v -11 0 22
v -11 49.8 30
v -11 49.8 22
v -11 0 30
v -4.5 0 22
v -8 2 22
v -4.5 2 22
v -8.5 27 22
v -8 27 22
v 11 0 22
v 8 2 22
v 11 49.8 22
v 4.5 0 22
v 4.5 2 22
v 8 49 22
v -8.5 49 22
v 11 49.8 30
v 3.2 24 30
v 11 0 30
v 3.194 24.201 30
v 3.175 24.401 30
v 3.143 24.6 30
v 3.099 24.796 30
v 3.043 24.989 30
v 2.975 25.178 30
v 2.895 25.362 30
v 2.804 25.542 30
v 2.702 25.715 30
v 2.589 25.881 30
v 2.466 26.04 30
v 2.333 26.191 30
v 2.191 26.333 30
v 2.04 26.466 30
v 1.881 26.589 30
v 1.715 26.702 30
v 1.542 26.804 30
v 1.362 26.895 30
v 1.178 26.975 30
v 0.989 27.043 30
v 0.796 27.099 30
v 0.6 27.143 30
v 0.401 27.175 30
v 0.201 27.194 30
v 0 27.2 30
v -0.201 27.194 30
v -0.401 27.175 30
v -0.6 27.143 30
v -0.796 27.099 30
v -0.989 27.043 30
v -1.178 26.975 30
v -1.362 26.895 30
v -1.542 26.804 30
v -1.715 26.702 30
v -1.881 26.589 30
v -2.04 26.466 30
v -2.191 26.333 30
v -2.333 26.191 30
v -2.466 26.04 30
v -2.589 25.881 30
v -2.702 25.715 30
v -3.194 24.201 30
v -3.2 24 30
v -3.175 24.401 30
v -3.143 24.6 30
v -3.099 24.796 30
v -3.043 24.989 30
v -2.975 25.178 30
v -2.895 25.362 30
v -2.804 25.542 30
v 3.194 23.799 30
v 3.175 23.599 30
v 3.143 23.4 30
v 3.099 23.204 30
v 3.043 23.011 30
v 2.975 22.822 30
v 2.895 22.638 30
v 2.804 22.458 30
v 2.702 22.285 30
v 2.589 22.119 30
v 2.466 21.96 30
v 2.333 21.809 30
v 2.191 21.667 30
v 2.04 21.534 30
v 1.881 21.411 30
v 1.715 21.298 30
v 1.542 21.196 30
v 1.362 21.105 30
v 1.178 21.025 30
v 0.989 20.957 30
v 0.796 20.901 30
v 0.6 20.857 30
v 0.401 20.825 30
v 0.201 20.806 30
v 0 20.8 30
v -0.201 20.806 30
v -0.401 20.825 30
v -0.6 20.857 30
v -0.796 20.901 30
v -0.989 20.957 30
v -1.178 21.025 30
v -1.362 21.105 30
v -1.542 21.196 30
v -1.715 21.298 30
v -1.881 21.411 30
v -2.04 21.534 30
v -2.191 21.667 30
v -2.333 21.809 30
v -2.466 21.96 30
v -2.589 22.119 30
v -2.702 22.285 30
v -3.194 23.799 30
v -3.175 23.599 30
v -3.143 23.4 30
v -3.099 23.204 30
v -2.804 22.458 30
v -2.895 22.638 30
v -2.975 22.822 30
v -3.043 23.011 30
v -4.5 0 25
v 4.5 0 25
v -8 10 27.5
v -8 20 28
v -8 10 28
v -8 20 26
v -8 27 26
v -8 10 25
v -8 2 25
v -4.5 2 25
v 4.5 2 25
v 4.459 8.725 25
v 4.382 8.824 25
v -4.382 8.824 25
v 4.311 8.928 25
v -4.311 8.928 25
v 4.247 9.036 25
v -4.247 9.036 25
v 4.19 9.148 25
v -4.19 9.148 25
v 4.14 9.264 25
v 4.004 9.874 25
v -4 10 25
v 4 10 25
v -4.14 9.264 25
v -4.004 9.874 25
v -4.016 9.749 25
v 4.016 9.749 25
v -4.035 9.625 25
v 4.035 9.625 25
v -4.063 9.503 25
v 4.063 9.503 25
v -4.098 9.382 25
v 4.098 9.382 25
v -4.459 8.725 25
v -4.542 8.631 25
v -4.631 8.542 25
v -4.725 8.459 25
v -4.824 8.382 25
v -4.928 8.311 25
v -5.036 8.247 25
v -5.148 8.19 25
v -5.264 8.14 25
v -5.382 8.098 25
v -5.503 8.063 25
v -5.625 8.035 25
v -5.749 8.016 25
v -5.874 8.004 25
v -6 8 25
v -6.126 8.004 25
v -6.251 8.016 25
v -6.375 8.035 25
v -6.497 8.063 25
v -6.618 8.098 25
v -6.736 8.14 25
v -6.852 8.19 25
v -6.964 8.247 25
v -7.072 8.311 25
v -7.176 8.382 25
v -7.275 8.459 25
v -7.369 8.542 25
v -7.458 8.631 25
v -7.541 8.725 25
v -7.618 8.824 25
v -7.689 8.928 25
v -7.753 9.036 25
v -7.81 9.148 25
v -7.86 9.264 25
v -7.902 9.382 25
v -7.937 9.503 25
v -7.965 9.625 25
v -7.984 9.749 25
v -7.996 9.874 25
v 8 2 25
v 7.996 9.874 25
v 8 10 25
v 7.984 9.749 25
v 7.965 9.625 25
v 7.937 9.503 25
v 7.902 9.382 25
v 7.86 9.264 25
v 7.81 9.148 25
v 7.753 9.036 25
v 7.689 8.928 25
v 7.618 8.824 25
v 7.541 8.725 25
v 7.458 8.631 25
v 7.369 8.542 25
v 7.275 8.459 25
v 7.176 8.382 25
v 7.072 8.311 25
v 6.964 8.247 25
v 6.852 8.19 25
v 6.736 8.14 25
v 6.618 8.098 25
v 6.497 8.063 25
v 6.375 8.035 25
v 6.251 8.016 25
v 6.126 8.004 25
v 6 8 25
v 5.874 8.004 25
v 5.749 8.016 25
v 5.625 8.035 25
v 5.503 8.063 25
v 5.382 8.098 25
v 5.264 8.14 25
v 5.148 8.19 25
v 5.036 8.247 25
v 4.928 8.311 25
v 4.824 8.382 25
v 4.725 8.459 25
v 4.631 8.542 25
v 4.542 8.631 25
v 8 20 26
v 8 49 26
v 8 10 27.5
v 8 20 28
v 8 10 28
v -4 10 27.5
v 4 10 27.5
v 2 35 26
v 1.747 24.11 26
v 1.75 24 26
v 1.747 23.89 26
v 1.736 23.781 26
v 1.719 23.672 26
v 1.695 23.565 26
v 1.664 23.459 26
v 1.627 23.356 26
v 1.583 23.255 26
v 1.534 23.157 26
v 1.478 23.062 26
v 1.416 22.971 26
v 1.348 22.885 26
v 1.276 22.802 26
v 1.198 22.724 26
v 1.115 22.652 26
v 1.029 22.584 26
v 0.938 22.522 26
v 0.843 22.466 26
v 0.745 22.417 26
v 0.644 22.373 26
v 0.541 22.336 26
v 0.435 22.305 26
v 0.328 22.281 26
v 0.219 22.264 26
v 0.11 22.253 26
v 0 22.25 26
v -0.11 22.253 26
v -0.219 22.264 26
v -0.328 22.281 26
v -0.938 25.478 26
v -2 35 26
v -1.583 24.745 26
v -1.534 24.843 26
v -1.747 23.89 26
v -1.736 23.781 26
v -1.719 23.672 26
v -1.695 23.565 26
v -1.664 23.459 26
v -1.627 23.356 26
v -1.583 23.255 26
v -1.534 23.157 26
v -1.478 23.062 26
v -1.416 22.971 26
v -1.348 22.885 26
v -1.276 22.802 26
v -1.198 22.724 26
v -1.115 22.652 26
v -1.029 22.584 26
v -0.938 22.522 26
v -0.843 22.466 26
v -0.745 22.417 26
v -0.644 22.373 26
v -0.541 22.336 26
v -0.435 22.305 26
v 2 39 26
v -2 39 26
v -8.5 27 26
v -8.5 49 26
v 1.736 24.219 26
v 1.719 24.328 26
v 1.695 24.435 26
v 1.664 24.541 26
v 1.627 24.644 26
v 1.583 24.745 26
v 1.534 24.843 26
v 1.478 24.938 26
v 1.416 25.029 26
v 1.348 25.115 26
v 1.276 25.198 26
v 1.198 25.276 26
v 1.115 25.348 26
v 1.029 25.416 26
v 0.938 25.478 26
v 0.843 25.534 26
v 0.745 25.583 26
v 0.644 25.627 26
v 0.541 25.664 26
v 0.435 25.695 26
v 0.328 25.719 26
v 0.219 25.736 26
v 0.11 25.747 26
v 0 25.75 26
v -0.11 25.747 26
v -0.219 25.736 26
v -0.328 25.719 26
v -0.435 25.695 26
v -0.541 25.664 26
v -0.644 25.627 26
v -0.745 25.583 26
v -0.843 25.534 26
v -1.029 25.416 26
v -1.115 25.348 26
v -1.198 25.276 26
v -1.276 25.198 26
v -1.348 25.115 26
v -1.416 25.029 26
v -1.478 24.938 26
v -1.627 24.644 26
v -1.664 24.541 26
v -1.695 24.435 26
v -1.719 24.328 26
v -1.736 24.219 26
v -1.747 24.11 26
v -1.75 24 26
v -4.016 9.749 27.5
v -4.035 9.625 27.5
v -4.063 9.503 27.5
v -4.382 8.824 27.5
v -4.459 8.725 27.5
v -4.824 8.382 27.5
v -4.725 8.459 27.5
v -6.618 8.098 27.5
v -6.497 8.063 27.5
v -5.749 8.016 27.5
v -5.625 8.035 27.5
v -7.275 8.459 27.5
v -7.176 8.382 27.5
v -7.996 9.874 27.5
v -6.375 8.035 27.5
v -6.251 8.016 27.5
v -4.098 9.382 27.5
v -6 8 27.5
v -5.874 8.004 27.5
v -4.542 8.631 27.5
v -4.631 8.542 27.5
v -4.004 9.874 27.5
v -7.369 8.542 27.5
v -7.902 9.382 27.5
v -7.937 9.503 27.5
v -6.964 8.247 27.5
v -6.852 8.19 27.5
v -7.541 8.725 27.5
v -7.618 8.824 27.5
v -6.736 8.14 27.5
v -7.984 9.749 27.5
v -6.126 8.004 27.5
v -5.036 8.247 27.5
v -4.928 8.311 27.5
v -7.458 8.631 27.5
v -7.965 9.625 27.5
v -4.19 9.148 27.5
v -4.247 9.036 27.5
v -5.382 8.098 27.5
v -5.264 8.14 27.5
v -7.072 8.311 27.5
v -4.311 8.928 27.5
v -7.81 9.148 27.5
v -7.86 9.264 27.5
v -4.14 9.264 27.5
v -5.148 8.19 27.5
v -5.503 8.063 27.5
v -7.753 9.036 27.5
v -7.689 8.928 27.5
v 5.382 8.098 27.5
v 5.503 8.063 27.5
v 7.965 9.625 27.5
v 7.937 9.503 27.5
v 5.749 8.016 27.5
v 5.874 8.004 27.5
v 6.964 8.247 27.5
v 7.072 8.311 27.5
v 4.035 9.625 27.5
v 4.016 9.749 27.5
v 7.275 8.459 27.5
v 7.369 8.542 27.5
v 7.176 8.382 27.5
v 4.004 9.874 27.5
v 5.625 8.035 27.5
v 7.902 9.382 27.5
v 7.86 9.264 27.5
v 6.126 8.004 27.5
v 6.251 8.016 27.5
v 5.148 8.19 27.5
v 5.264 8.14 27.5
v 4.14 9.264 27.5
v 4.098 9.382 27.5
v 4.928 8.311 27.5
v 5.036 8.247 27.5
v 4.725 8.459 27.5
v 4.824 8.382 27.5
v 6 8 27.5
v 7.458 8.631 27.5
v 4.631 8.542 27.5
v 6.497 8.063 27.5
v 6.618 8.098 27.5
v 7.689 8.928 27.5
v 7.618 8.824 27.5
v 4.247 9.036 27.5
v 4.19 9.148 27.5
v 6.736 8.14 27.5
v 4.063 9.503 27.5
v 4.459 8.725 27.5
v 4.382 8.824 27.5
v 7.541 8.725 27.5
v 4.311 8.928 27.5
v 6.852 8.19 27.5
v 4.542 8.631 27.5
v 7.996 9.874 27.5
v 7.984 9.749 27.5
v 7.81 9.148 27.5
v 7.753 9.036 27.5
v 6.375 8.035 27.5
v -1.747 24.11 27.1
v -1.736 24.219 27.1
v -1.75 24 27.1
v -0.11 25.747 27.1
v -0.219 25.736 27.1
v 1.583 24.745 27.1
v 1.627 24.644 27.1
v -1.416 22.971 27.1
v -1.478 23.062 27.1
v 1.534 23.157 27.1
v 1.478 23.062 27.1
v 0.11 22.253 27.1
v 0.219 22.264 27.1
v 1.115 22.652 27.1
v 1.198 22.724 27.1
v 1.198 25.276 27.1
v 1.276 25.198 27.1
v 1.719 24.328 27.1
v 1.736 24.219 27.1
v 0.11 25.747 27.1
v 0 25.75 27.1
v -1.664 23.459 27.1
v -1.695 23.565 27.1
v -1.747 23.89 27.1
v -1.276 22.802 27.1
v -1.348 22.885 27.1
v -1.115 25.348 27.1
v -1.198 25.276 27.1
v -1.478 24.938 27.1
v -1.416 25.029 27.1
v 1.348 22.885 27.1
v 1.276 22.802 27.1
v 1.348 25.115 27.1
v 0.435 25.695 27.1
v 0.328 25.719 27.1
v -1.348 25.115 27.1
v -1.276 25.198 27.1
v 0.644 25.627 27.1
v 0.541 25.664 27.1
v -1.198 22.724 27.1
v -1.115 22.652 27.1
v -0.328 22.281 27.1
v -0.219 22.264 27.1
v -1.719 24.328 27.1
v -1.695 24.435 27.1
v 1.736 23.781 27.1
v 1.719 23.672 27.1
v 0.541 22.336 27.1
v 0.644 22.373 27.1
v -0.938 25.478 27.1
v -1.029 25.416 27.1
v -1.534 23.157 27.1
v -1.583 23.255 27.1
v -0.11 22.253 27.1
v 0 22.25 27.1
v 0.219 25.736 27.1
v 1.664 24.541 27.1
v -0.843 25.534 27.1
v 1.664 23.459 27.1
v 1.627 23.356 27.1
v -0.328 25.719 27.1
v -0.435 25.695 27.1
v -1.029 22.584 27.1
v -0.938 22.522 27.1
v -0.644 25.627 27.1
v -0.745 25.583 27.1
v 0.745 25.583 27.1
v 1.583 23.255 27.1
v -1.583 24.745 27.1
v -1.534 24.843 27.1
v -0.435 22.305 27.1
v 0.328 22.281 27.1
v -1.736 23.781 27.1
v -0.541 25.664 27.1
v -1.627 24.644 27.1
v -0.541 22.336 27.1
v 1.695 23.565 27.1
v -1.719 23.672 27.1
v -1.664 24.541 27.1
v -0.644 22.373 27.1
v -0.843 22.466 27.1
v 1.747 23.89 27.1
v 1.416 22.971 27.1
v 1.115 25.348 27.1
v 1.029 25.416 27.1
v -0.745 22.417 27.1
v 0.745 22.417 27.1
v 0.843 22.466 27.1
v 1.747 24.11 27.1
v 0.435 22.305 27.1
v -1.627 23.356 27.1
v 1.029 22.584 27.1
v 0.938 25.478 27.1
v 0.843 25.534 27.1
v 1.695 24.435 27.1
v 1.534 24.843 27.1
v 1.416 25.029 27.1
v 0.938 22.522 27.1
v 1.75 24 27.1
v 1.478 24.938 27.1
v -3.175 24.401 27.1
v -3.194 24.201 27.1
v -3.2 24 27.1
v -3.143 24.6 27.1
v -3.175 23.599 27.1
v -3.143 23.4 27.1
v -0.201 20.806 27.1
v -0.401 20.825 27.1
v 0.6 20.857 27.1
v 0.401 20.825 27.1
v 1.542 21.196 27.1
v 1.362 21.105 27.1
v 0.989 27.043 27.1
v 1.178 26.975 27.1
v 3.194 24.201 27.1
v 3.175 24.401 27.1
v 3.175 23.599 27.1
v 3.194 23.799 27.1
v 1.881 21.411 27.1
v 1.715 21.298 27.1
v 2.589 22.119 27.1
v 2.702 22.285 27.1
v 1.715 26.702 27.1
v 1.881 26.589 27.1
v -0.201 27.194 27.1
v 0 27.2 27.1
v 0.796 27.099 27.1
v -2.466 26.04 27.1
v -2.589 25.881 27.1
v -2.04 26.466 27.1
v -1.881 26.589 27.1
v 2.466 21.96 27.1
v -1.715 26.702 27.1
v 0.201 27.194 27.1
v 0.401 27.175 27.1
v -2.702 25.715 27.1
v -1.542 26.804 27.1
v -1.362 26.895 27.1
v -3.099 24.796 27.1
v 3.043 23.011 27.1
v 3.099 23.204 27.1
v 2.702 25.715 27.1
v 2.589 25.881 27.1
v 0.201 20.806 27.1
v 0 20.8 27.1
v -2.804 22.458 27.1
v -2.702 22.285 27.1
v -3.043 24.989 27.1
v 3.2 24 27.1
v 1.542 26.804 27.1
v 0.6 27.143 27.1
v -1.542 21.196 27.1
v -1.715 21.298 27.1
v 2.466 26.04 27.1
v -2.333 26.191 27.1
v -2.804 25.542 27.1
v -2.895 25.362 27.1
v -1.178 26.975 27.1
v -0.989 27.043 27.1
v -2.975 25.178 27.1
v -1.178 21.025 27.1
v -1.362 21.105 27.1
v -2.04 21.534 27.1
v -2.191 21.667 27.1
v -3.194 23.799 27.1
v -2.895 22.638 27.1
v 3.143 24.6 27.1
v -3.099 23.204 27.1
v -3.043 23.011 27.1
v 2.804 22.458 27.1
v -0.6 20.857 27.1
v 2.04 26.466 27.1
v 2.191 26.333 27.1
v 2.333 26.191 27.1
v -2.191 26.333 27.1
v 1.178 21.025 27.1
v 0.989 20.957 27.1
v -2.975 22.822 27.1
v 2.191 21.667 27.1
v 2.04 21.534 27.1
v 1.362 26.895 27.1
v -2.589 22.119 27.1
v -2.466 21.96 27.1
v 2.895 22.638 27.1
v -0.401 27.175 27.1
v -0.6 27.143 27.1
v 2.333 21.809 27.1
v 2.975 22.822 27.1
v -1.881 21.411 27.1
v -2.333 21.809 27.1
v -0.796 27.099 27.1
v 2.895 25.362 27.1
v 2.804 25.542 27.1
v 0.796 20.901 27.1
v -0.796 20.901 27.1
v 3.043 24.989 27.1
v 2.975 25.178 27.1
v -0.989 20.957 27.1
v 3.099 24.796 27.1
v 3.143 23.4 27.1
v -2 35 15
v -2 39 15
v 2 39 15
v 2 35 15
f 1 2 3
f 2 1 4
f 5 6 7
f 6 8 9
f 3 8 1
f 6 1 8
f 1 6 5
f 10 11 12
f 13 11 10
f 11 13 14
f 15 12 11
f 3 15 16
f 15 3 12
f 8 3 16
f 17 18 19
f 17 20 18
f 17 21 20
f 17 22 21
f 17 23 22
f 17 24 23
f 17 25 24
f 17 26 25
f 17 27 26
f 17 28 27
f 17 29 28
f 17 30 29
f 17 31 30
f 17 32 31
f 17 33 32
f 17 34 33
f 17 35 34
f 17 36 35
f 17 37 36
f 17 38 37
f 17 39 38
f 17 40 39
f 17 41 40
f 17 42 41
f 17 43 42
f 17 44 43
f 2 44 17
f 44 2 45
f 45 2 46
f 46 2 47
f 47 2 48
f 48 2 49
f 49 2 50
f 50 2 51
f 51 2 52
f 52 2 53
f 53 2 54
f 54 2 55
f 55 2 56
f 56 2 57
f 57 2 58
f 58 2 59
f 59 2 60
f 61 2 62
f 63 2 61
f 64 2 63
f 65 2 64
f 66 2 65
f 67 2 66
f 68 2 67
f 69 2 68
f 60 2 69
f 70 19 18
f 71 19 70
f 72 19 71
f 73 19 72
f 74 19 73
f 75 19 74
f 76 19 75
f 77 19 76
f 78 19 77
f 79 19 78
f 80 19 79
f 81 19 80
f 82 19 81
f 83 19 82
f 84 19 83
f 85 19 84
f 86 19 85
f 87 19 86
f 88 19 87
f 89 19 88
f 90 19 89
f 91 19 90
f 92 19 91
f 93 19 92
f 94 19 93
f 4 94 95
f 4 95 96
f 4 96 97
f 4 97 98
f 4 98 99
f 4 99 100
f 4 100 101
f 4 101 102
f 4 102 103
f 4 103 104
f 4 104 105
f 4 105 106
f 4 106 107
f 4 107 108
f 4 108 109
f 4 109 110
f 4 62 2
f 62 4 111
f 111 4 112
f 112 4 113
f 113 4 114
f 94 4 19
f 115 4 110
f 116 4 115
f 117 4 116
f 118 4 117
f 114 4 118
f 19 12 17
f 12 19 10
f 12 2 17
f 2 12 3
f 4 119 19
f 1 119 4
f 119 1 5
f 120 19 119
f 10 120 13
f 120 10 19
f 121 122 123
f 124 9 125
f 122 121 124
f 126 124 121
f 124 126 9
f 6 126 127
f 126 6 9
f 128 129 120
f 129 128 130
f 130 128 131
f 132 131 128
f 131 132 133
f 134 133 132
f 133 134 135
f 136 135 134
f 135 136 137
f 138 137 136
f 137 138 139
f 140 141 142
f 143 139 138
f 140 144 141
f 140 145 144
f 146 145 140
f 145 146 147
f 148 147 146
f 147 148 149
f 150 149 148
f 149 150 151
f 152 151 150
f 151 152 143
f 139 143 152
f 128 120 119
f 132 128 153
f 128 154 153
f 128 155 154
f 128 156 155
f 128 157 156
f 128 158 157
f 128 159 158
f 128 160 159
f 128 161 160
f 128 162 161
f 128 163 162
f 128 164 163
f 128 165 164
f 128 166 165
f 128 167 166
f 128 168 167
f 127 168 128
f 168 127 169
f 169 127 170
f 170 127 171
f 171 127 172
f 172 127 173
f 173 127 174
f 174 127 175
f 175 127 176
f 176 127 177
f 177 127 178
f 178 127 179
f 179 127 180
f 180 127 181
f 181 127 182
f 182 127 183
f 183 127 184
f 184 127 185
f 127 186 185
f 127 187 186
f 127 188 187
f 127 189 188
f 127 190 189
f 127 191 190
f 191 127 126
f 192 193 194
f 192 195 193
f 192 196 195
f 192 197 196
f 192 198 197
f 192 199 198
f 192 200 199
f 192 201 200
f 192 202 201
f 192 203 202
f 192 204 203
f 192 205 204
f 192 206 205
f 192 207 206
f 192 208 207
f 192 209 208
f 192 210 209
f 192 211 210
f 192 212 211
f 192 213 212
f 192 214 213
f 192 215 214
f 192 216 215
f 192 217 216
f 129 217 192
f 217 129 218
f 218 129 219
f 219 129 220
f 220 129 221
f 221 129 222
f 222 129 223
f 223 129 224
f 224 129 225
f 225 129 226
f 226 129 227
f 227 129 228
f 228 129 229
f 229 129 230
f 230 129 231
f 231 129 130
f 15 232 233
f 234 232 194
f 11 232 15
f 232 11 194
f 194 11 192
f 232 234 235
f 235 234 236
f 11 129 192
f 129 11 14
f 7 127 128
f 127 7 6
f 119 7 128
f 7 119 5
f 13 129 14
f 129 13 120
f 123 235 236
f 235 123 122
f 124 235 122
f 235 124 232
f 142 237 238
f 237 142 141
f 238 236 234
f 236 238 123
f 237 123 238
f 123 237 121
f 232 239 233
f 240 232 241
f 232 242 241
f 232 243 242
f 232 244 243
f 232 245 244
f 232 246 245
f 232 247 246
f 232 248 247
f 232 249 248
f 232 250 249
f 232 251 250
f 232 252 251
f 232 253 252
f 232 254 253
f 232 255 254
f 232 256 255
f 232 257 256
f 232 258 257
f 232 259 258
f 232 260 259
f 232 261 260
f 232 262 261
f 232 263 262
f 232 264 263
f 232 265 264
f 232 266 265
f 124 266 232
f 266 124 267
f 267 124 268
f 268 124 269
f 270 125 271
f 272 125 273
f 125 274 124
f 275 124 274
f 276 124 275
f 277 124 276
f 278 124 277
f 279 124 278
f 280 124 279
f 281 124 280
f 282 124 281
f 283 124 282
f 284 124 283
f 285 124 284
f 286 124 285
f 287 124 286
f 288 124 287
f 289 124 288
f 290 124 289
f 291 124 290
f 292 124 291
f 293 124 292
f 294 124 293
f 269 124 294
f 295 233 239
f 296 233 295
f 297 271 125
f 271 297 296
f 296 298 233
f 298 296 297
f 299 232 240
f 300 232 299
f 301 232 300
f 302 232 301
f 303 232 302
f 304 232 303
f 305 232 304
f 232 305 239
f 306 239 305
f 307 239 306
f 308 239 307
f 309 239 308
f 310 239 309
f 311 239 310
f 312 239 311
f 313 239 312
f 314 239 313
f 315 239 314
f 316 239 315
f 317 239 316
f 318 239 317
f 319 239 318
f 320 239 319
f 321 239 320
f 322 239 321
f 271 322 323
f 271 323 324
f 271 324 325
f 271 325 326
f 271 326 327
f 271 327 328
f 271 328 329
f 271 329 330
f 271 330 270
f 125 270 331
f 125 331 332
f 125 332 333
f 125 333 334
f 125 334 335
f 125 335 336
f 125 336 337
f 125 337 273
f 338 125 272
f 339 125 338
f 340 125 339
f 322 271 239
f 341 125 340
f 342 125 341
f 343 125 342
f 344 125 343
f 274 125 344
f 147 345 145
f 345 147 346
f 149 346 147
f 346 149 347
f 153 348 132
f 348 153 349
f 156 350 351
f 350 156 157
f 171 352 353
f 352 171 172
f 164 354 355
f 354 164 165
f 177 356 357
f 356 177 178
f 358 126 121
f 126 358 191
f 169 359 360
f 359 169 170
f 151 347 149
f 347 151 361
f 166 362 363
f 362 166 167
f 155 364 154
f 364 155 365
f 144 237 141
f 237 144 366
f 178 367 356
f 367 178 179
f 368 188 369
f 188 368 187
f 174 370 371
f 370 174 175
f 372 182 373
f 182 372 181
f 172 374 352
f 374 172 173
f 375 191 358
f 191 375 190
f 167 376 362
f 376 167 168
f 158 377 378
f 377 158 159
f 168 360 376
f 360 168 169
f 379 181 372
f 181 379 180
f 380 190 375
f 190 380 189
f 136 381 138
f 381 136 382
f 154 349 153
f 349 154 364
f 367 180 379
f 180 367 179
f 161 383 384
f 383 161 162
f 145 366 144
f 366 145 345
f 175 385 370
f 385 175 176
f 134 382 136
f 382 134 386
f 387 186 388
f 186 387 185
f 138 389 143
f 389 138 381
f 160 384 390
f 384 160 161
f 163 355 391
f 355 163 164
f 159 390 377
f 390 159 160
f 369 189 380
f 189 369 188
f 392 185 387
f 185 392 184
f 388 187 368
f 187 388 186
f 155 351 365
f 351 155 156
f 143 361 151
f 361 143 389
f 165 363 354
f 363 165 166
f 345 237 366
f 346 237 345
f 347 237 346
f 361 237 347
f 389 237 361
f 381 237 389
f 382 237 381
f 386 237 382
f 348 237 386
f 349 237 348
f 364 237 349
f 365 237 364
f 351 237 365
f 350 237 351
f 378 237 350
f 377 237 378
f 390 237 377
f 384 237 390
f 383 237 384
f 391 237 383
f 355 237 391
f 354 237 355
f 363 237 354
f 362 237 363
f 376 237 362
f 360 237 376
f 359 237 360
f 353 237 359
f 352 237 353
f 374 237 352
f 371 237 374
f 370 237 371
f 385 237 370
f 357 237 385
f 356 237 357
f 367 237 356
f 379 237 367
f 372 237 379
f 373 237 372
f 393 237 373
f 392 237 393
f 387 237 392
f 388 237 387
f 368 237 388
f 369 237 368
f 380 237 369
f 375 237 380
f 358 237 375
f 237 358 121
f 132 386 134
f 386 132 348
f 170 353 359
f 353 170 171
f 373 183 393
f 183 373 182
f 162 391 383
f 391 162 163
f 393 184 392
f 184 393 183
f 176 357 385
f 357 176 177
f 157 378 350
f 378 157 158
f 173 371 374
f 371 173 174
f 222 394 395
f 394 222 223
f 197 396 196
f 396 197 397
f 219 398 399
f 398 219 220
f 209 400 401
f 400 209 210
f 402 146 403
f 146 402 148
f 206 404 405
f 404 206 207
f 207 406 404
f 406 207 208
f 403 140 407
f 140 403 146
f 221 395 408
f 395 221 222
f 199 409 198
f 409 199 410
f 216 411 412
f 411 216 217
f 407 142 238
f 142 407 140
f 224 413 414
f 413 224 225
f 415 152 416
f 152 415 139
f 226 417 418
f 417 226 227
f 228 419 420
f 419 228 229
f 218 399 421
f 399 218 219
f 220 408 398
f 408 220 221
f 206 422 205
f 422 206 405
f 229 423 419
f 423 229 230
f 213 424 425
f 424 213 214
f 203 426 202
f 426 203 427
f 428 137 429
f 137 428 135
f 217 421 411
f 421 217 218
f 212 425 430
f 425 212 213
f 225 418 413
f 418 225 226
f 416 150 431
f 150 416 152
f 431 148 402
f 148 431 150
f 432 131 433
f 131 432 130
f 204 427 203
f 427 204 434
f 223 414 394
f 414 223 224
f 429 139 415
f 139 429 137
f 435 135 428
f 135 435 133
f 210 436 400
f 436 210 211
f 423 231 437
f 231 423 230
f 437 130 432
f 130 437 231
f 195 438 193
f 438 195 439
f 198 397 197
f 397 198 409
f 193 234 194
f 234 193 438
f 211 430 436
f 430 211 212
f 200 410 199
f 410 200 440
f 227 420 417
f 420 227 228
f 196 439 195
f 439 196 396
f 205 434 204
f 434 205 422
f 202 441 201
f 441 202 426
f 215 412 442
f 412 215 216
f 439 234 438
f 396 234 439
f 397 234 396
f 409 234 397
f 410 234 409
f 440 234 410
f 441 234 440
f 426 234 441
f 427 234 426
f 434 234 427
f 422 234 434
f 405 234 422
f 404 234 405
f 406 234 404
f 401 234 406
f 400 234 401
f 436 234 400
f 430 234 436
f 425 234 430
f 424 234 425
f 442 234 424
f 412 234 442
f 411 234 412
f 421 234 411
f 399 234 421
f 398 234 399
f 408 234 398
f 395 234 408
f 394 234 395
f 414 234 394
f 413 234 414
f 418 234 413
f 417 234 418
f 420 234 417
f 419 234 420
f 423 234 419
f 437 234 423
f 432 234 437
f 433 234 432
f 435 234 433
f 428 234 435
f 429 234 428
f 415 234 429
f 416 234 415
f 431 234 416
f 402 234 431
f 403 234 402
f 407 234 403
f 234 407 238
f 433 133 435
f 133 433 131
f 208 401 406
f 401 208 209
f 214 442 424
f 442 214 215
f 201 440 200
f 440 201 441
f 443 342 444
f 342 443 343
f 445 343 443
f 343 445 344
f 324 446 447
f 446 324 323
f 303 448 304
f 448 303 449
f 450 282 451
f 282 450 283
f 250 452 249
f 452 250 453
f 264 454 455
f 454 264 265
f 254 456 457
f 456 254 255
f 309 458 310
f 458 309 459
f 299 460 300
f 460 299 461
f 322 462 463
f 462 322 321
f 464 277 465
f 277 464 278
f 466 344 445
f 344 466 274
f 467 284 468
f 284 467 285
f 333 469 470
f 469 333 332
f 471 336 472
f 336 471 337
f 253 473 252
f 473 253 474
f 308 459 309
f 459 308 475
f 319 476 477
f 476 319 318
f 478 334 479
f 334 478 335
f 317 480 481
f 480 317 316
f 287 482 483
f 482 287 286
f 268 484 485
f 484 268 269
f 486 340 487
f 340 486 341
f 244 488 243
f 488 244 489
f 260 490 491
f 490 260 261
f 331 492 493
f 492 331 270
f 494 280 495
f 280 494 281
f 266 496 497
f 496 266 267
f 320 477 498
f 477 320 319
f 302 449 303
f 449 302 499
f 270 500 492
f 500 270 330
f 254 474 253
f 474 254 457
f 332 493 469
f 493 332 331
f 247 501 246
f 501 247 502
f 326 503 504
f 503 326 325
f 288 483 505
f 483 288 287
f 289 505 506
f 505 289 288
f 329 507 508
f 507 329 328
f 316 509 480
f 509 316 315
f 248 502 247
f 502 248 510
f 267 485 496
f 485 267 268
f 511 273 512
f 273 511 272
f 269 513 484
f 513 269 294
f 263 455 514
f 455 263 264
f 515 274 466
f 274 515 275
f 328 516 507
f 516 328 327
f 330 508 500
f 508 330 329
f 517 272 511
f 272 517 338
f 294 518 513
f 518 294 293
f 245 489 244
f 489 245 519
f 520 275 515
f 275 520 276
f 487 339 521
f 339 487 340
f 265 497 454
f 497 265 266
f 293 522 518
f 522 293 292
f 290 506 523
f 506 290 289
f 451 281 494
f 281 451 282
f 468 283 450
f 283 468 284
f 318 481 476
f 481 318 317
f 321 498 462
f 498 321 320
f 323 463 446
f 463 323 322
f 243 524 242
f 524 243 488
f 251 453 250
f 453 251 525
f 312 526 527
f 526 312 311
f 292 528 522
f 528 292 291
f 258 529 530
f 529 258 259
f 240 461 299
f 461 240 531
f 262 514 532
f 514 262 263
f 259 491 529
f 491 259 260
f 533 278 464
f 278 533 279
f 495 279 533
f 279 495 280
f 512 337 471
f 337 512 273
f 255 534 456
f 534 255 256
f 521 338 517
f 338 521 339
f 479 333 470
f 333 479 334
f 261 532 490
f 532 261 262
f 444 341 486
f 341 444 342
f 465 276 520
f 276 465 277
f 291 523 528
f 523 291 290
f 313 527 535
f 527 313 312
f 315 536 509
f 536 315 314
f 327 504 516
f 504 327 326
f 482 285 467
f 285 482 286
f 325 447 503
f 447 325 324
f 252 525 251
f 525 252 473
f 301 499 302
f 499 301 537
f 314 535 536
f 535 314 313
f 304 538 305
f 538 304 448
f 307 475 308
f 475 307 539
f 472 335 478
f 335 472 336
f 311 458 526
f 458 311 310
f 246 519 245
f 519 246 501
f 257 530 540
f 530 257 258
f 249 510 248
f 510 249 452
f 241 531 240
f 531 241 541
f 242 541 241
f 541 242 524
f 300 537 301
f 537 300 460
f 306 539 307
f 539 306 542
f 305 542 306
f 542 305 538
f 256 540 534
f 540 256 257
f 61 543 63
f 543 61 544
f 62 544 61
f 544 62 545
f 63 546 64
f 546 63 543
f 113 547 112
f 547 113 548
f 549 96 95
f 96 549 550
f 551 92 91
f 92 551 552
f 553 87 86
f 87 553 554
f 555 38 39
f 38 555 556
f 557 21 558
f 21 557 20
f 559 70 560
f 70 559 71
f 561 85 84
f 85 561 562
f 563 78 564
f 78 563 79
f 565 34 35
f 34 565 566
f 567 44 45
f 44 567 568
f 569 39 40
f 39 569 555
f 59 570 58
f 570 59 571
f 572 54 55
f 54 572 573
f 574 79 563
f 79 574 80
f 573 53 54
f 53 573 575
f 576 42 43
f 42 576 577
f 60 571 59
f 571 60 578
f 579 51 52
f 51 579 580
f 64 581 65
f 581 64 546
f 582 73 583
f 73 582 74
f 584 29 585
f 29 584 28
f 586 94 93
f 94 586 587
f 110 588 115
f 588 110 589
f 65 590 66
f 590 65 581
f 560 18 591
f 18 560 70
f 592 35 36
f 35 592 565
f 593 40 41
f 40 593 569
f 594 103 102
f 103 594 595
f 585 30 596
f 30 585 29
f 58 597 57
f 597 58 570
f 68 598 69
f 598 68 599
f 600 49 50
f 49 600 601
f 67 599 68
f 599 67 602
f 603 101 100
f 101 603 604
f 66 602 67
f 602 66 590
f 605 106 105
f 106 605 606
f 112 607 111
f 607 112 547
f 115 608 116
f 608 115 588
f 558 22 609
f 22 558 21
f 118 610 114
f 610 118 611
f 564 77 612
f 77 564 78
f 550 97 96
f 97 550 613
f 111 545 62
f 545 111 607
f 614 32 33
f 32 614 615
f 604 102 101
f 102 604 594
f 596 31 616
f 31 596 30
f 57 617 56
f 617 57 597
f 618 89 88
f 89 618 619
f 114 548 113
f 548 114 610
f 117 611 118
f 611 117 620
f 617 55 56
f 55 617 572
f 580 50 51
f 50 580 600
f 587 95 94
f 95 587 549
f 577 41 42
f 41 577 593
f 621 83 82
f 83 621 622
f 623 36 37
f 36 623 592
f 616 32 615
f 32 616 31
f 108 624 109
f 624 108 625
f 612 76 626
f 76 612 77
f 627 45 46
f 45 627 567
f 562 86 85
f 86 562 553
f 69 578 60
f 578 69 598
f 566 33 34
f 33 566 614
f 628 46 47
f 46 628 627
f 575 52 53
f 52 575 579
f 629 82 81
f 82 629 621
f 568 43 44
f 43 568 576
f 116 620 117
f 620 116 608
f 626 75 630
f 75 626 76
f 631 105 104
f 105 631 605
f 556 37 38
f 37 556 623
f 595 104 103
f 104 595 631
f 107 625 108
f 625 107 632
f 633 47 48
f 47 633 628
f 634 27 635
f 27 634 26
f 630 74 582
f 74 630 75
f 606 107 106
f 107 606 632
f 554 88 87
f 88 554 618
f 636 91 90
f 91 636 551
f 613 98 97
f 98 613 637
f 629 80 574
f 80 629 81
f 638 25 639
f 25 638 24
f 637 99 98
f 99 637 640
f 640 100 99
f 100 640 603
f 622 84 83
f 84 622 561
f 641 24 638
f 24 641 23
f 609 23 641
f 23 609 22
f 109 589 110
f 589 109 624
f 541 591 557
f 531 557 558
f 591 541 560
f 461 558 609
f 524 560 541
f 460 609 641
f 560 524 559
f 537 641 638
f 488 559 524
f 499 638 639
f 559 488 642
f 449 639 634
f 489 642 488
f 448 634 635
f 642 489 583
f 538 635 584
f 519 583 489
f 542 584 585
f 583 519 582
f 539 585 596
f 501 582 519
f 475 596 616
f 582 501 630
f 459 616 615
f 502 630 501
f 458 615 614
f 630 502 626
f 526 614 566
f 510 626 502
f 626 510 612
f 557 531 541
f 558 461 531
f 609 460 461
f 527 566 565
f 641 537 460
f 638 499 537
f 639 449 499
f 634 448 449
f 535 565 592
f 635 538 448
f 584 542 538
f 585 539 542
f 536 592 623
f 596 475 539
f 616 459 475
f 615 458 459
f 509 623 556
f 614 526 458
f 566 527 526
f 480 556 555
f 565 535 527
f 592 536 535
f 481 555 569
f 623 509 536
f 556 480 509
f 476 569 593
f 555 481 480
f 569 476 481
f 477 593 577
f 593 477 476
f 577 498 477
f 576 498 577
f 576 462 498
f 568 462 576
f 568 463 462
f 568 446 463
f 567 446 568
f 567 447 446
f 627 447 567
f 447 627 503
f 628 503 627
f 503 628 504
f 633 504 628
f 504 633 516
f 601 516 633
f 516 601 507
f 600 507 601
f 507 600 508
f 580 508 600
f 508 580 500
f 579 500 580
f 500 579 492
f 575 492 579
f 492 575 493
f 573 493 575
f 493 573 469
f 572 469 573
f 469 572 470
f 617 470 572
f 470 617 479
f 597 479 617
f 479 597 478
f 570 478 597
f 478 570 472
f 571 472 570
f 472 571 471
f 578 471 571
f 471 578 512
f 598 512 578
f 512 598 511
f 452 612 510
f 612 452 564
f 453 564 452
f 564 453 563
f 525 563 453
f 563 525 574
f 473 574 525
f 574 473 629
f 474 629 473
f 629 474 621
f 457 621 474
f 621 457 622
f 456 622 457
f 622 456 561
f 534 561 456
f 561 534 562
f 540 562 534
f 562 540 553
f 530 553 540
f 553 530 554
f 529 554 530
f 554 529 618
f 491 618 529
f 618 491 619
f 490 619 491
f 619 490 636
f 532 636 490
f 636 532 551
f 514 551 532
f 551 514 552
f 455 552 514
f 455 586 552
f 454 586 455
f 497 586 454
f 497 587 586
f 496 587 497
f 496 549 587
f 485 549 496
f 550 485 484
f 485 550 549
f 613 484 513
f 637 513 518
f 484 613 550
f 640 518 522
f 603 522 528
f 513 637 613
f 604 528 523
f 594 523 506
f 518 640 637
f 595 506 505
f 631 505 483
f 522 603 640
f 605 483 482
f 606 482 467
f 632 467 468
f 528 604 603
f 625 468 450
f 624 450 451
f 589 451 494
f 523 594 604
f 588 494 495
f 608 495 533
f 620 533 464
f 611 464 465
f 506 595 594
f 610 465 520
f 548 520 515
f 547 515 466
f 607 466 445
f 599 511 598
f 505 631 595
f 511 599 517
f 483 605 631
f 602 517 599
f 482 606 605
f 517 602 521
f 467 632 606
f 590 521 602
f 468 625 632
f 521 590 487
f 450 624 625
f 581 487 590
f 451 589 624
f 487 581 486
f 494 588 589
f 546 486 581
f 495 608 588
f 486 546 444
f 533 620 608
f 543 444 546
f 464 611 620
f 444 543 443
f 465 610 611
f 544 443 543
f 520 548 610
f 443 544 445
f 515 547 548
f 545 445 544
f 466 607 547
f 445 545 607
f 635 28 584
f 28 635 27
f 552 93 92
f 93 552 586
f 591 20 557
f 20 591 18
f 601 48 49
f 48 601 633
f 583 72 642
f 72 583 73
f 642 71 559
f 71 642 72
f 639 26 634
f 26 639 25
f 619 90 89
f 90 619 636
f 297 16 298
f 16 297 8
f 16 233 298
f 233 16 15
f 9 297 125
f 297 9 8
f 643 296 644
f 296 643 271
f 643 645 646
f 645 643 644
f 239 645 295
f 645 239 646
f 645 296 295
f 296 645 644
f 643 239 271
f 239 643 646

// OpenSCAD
$fn= 100;


module pa(){
difference(){
    translate([-11, 0, 0]) cube([22, 49.8, 10]);
    
    // dira pro RJ45
    translate([(30-16)/2-15, 2, 1]) cube([16, 19, 10]);
    translate([(30-13)/2-15, -0.1, 1+1.5]) cube([13, 19, 10]);
    
    // dira pro sroub
    translate([0, 24, -0.1]) cylinder(d=3.4, h=15);
    translate([0, 24, -0.1]) cylinder(d=6.4, h=3, $fn=6);
    
    // dira pro prevodnik
    translate([(30-16)/2-15, 27, 1+3]) cube([16.5, 22, 10]);
    translate([(30-8)/2-15, 27, 1+3+2]) cube([8, 25, 3]);
}}


module pb(){
difference(){
    translate([-11, 0, 0]) cube([22, 49.8, 8]);
    
    // dira pro RJ45
    translate([(30-16)/2-15, 2, 5]) cube([16, 19, 3]);
    translate([(30-9)/2-15, -0.1, 5]) cube([9, 19, 3]);
    translate([(30-16)/2-15, 10, 2]) cube([16, 10, 6.1]);
    translate([(30-16)/2-15, 13, 4]) cube([16, 20, 6.1]);
    
    translate([6, 10, 9-6.5]) cylinder(d=4, h=6.5);
    translate([-6, 10, 9-6.5]) cylinder(d=4, h=6.5);
    
    // dira pro sroub
    translate([0, 24, -0.1]) cylinder(d=3.5, h=15);
    translate([0, 24, -0.1]) cylinder(d=6.4, h=3);
    
    // dira pro prevodnik
    translate([(30-16)/2-15, 27, 1+3]) cube([16.5, 22, 10]);
    //translate([(30-8)/2-15, 27, 1+3+2]) cube([8, 25, 3]);
}
    translate([(30-4)/2-15, 27+8, 1+3]) cube([4, 4, 3+8]);
    
}

translate([0,0,30]) rotate([0,180,0]) pb();
//pa();
